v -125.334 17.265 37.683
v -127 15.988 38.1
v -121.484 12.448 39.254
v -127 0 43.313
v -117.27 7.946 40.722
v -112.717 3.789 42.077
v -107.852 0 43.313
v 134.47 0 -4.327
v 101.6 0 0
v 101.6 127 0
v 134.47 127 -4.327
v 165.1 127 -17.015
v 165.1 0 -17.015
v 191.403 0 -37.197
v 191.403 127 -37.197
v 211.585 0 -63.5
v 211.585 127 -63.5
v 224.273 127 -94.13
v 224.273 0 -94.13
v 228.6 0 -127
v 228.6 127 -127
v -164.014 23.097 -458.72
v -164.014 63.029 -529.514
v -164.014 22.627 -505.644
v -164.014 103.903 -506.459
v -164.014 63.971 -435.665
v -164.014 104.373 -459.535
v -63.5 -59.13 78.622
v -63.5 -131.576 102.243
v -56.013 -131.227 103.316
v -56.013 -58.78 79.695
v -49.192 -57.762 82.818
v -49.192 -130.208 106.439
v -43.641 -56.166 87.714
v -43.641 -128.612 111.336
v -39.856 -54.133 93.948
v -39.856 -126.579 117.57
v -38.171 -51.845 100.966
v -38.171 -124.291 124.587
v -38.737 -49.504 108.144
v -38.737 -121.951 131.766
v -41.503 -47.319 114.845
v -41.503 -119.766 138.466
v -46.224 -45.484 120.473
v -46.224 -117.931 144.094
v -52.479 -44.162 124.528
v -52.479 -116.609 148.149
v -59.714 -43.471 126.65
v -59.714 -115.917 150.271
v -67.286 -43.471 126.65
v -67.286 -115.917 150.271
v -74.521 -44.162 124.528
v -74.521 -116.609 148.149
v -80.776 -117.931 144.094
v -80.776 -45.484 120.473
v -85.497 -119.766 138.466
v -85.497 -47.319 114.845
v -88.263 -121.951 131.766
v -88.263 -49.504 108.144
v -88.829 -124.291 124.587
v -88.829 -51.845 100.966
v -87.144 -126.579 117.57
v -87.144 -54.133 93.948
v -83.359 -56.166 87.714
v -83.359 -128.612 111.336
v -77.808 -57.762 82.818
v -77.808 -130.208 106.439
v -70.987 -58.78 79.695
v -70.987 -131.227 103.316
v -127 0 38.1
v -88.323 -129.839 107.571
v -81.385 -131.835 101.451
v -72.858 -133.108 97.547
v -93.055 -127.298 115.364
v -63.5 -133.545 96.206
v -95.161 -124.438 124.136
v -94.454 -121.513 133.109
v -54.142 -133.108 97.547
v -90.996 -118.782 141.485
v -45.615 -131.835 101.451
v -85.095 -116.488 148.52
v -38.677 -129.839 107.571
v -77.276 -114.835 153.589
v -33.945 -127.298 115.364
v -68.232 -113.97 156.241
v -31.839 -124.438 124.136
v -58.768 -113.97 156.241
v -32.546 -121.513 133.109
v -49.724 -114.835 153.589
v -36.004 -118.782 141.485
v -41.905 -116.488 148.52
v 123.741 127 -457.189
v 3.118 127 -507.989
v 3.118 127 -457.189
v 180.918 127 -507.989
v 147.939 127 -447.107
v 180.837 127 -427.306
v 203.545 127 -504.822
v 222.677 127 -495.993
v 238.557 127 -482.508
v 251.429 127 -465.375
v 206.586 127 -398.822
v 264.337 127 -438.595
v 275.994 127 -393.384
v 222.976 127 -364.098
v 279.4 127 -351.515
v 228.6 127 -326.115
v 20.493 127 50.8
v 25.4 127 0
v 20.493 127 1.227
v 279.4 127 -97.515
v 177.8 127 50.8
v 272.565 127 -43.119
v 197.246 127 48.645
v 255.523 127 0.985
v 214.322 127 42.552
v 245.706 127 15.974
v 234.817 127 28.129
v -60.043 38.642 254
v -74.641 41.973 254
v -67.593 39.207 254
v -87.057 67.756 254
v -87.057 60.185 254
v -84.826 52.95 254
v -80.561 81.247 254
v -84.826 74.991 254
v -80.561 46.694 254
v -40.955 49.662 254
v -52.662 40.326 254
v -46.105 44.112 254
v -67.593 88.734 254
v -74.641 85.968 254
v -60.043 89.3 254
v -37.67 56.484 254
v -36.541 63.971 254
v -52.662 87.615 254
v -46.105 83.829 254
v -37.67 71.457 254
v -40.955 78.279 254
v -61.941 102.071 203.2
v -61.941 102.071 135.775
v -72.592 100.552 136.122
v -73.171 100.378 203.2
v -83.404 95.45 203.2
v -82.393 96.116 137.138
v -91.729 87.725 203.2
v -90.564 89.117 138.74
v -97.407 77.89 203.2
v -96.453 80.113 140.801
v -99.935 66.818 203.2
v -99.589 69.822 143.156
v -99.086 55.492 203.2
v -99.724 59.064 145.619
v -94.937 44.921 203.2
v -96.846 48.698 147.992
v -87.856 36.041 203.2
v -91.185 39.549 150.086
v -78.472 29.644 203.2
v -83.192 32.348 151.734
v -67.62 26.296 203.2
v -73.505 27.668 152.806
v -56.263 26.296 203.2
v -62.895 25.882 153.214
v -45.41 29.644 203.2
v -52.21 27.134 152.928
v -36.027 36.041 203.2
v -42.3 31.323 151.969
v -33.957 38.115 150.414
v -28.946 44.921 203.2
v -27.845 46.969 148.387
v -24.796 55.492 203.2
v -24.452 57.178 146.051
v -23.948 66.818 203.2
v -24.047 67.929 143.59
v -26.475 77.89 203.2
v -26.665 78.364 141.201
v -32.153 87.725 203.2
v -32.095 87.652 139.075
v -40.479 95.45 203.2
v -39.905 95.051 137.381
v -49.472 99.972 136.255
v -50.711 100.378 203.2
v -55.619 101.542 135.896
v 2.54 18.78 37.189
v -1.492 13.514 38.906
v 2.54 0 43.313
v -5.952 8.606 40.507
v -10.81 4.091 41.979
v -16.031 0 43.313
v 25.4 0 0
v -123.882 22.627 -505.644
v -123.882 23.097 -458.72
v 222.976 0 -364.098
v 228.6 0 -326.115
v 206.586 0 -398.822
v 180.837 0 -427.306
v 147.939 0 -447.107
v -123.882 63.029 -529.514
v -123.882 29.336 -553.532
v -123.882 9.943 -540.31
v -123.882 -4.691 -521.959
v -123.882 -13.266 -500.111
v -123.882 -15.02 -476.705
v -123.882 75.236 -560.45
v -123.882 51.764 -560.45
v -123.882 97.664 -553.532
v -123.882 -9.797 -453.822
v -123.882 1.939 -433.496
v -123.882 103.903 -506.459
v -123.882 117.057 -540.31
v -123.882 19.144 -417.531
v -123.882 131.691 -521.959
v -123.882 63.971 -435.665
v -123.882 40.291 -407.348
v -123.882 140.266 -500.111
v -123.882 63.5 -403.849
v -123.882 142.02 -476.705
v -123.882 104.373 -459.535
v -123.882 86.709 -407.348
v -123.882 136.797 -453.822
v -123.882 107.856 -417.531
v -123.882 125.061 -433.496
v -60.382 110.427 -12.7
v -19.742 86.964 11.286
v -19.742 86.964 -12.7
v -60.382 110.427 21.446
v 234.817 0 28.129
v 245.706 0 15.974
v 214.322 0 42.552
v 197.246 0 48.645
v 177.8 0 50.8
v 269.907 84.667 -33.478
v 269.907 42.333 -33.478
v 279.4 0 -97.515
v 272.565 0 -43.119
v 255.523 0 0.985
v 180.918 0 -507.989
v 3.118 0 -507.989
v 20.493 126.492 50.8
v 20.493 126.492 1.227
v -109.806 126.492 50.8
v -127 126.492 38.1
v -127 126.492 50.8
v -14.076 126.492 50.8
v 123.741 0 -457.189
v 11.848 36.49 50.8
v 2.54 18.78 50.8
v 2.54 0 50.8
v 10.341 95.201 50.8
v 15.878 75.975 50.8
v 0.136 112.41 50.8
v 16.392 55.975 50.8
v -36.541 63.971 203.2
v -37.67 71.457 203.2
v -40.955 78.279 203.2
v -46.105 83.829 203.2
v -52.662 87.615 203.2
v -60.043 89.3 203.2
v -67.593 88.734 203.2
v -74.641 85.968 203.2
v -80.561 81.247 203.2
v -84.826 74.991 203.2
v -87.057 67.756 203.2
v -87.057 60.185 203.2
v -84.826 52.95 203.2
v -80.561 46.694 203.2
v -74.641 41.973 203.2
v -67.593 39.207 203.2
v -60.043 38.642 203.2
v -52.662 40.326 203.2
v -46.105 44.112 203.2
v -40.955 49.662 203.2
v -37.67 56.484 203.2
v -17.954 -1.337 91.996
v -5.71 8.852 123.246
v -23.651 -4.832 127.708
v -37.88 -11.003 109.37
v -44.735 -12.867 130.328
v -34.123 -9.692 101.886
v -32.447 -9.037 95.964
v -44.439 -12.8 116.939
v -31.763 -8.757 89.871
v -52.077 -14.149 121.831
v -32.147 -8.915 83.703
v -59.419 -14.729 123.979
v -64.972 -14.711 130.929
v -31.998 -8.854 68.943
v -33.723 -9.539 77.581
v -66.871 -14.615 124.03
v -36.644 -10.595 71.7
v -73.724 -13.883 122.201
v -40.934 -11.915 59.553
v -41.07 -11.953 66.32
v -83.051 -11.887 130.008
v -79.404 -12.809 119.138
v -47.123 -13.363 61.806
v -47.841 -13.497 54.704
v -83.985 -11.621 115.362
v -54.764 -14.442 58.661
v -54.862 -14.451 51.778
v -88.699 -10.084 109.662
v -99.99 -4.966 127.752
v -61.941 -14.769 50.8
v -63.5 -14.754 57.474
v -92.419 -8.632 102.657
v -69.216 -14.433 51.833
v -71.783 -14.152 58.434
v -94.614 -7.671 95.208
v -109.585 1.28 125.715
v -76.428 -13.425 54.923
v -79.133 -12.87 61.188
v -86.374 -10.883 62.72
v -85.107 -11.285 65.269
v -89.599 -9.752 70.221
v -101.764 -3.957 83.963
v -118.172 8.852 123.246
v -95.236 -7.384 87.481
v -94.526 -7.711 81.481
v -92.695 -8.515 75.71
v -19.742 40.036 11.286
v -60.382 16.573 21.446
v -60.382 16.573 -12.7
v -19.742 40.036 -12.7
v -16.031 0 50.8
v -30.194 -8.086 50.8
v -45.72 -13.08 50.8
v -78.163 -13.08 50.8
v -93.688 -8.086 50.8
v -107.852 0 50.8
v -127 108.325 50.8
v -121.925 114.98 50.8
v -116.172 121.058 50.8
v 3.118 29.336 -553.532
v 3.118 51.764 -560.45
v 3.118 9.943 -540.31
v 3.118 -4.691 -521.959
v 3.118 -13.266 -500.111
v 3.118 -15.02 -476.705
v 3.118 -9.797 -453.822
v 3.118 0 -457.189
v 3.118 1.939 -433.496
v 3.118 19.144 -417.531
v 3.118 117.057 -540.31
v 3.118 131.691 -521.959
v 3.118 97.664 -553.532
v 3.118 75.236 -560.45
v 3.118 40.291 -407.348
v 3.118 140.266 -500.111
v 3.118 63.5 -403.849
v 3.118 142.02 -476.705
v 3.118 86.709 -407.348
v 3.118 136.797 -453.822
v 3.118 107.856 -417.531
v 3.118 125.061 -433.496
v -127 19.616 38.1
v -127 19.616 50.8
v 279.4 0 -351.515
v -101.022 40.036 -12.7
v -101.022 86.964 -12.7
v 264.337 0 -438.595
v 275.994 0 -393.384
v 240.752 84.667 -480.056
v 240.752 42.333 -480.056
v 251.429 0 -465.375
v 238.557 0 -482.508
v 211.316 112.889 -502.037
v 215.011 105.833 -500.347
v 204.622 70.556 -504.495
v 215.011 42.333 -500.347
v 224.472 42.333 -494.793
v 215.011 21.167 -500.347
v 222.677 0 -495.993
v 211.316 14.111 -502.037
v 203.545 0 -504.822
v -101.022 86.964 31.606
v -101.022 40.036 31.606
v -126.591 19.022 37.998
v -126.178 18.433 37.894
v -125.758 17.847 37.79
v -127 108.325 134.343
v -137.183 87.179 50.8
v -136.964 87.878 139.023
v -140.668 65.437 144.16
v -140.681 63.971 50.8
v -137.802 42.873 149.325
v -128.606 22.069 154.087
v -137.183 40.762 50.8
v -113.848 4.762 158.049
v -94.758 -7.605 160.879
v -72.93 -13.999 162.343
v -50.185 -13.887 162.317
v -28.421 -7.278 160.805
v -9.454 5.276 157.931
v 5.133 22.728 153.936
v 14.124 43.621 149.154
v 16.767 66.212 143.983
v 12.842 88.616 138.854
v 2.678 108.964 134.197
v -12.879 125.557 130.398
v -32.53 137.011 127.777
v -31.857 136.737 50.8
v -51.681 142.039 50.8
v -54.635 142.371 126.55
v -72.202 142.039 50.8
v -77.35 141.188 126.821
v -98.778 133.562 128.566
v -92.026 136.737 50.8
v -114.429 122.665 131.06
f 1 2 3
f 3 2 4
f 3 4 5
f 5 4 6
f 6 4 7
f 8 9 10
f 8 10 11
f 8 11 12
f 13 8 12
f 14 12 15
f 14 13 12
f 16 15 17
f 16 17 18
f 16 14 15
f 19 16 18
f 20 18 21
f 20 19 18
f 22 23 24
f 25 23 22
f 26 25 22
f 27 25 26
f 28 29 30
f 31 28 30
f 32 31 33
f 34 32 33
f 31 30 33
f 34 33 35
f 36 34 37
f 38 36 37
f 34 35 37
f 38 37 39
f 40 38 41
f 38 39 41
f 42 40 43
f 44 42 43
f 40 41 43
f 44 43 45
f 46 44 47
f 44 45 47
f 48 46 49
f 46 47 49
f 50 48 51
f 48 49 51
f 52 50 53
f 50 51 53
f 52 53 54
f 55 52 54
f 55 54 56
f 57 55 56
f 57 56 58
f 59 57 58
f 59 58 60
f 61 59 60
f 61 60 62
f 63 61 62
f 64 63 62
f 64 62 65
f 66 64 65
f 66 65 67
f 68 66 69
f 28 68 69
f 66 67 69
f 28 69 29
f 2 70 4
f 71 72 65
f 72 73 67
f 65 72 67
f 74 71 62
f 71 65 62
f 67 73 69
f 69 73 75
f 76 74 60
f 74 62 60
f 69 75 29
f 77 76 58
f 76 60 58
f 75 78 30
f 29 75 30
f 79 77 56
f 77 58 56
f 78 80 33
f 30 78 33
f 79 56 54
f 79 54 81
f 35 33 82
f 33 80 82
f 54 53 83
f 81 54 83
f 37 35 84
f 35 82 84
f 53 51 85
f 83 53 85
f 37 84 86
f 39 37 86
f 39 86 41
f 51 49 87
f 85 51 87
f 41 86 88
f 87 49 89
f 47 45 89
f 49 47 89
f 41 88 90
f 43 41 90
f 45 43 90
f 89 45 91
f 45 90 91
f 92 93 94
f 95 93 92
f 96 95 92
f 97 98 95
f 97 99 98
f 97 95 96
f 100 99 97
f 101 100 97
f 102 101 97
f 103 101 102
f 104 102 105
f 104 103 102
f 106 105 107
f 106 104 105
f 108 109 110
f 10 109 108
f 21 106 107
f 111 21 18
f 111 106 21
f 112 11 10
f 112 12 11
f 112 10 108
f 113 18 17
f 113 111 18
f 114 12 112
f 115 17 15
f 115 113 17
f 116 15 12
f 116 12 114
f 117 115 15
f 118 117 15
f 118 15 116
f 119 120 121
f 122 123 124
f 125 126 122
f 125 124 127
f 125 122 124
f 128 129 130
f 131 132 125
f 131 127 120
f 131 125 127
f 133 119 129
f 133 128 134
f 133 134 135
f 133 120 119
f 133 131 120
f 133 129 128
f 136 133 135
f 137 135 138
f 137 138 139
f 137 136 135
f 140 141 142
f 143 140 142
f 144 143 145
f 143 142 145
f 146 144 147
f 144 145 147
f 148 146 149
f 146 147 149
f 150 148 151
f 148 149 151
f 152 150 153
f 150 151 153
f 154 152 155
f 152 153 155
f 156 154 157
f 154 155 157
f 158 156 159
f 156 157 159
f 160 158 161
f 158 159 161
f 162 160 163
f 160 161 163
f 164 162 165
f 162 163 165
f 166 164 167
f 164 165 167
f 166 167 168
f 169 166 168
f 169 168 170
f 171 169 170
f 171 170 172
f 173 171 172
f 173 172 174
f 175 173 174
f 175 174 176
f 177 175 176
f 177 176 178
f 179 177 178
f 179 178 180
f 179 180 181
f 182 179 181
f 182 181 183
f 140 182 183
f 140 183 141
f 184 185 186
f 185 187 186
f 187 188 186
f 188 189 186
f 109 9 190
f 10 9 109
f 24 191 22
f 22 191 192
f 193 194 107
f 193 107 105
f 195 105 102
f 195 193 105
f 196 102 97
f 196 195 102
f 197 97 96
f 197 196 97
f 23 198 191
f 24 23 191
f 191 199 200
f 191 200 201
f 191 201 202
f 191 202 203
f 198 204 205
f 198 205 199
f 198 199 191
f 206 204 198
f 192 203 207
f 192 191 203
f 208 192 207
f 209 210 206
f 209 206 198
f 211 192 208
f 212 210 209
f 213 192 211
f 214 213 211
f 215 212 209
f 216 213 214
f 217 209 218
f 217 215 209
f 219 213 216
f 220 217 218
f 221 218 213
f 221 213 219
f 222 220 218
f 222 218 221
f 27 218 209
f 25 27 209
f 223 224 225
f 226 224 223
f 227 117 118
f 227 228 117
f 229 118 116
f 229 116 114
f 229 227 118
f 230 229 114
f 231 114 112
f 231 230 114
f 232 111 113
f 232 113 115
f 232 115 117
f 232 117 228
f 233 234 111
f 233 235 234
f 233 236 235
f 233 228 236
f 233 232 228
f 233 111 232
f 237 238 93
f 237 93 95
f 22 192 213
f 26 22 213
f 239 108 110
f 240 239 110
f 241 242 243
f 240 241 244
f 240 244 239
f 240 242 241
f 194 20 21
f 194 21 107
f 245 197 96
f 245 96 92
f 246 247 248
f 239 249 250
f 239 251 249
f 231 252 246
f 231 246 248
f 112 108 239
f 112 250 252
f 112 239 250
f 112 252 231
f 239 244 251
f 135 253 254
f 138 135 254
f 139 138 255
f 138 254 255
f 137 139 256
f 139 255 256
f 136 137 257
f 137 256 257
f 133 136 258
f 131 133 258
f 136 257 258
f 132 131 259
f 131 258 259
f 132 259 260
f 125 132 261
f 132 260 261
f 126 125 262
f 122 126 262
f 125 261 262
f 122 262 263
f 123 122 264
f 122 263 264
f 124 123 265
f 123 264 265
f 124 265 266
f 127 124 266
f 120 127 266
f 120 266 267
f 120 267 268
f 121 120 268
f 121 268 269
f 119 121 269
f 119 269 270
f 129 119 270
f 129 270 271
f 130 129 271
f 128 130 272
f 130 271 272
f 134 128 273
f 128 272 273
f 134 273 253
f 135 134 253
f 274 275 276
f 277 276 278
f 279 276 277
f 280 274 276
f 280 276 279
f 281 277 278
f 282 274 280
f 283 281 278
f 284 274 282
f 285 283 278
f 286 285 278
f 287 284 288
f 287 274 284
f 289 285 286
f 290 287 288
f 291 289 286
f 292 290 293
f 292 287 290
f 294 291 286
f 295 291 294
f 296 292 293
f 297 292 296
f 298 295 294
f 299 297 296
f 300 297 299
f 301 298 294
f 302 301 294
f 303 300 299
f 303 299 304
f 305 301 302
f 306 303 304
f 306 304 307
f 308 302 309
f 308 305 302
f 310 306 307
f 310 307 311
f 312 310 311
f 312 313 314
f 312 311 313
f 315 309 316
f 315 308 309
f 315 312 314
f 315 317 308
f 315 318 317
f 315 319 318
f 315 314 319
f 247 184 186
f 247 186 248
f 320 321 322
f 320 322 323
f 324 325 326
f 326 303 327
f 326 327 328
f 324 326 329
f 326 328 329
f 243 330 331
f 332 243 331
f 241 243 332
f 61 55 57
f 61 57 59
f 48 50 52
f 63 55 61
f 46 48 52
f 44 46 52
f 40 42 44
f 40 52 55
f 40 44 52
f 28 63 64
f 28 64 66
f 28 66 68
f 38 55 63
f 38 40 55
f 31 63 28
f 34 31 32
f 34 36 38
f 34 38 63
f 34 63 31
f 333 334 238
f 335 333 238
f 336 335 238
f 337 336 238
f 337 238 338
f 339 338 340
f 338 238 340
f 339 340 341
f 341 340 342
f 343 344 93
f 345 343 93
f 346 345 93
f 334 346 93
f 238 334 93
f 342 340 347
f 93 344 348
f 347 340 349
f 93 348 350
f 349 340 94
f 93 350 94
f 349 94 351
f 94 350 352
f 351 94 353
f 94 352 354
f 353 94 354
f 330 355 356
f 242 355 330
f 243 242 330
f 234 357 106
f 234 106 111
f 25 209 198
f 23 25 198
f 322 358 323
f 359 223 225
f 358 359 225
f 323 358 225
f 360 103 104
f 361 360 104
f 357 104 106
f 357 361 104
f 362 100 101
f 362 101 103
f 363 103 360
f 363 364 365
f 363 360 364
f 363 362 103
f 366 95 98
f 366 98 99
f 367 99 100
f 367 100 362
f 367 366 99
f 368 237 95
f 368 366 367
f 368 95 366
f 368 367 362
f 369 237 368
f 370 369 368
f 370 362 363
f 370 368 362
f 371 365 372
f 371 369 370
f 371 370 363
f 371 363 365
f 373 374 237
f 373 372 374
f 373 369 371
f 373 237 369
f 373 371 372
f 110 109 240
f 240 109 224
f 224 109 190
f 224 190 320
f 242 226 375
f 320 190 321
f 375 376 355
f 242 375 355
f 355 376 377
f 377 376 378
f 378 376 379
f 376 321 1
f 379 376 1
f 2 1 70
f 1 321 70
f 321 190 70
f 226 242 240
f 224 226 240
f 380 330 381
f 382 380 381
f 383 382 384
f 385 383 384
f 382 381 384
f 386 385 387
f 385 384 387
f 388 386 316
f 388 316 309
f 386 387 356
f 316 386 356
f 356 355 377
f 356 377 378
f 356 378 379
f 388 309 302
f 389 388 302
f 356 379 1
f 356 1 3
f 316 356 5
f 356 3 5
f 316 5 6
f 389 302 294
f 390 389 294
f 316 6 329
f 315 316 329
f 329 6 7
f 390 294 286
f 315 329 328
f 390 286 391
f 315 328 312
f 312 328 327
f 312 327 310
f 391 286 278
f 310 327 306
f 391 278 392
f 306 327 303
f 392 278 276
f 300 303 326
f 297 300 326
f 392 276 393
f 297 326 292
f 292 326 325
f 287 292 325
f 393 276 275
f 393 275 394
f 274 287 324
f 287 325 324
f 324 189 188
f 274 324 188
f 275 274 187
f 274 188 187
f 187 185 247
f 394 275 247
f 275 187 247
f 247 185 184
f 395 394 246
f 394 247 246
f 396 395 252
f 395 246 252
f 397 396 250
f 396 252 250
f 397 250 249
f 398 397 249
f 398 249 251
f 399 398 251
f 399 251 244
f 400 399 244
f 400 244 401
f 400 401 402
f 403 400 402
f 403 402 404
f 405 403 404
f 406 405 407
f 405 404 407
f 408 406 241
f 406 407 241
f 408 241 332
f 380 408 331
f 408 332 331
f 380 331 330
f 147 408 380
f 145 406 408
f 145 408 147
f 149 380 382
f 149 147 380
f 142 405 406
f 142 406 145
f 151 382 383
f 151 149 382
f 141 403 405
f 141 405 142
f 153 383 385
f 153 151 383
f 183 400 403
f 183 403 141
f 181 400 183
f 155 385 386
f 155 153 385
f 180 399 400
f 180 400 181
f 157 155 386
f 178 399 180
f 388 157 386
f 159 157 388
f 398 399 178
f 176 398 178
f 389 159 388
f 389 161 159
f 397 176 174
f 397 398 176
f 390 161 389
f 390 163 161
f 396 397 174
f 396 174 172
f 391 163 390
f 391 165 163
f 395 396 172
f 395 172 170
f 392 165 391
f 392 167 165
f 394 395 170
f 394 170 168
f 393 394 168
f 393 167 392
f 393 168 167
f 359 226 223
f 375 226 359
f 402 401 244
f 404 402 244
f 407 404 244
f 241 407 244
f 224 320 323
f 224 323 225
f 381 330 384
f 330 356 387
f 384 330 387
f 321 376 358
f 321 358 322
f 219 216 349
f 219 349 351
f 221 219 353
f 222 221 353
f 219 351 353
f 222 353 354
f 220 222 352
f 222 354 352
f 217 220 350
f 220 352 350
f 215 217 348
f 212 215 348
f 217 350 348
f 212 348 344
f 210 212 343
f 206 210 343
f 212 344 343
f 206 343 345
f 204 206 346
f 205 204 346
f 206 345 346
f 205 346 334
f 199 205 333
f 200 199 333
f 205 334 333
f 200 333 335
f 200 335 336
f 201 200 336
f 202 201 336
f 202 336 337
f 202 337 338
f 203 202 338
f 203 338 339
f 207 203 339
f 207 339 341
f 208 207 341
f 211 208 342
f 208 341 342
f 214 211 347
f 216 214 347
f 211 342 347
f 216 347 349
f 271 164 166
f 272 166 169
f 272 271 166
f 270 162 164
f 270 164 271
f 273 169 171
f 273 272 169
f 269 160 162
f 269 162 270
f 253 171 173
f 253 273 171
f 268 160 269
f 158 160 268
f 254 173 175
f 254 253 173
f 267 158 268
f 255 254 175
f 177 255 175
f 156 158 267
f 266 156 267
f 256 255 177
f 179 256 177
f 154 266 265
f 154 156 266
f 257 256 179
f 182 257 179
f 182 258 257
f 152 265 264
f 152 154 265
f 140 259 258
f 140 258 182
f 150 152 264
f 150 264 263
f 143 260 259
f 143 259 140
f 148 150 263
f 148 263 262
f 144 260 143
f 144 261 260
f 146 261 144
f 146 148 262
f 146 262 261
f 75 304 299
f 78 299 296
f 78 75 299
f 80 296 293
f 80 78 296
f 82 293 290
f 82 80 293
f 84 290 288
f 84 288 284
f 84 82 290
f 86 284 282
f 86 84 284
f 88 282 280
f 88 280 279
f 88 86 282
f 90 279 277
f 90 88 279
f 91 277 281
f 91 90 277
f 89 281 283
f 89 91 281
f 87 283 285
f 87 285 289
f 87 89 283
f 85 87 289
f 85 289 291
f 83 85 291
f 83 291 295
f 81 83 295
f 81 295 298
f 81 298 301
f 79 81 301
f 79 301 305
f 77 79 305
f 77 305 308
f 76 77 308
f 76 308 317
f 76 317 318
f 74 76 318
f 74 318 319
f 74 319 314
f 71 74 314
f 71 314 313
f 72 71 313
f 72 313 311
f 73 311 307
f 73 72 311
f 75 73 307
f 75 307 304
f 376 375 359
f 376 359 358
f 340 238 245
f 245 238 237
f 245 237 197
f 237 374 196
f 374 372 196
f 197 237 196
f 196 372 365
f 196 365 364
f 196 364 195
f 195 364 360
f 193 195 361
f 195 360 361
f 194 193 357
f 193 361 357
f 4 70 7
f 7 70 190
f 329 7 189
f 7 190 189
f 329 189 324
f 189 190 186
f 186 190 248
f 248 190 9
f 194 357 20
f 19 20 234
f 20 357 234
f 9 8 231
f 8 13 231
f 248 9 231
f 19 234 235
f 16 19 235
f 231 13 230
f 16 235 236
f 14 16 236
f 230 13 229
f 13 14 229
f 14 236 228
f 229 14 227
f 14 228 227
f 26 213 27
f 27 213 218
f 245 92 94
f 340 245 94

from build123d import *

# Parameters (mm, degrees)
BOSS_EXTRUDE1_DEPTH      = 127
SKETCH2_R                = 78.74
BOSS_EXTRUDE2_DEPTH      = 127
BOSS_EXTRUDE3_DEPTH      = 40.132
SKETCH4_W                = 50.8
SKETCH4_H                = 127
BOSS_EXTRUDE4_DEPTH      = 127
CUT_EXTRUDE1_DEPTH       = 643.951973118
BOSS_EXTRUDE6_DEPTH      = 63.5
BOSS_EXTRUDE7_DEPTH      = 0.254
SKETCH10_R               = 78.74
BOSS_EXTRUDE8_DEPTH      = 127
CUT_EXTRUDE4_DEPTH       = 1270
SKETCH12_R               = 38.1
BOSS_EXTRUDE9_DEPTH      = 152.4
SKETCH13_R               = 25.4
BOSS_EXTRUDE10_DEPTH     = 50.8
BOSS_EXTRUDE11_DEPTH     = 127
CUT_EXTRUDE16_DEPTH      = 0.508
CUT_EXTRUDE17_REACH      = 733.584
CUT_EXTRUDE17_END_RADIUS = 78.74
SKETCH25_W               = 132.08
SKETCH25_H               = 81.28
SKETCH25_R               = 31.75
SKETCH26_R               = 25.4
CUT_EXTRUDE18_DEPTH      = 76.2


with BuildPart() as part:
    # Sketch1 → Boss-Extrude1 (new body)
    with BuildSketch(Plane(origin=(0, 0, 0), x_dir=(1, 0, 0), z_dir=(0, 1, 0))):
        with BuildLine():
            Line((0, 0), (76.2, 0))
            Line((76.2, 0), (101.6, 0))
            ThreePointArc((101.6, 0), (191.402561211, 37.197438789), (228.6, 127))
            Line((228.6, 127), (228.6, 326.115224022))
            ThreePointArc((228.6, 326.115224022), (206.586135695, 398.822078741), (147.938986841, 447.106743761))
            Line((147.938986841, 447.106743761), (123.740682893, 457.189370406))
            Line((123.740682893, 457.189370406), (3.117633302, 457.189370406))
            Line((3.117633302, 457.189370406), (3.117633302, 507.989370406))
            Line((3.117633302, 507.989370406), (130.117633302, 507.989370406))
            Line((130.117633302, 507.989370406), (180.917633302, 507.989370406))
            add(Edge.make_bspline(
                [(180.917633302, 507.989370406), (258.096842752, 507.989370406), (279.4, 408.366132146), (279.4, 351.515224022)],
                knots=[0, 0, 0, 0, 0.284383622, 0.284383622, 0.284383622, 0.284383622], degree=3))
            Line((279.4, 351.515224022), (279.4, 97.515224022))
            add(Edge.make_bspline(
                [(279.4, 97.515224022), (279.4, 39.949501281), (253.612703292, -50.8), (177.8, -50.8)],
                knots=[0.713423735, 0.713423735, 0.713423735, 0.713423735, 1, 1, 1, 1], degree=3))
            Line((177.8, -50.8), (127, -50.8))
            Line((127, -50.8), (0, -50.8))
            Line((0, -50.8), (0, 0))
        make_face()
    extrude(amount=BOSS_EXTRUDE1_DEPTH)

    # Sketch2 → Boss-Extrude2 (add)
    with BuildSketch(Plane.ZY.offset(-3.117633302)):
        with Locations((-482.589370406, 63.5)):
            Circle(SKETCH2_R)
    extrude(amount=BOSS_EXTRUDE2_DEPTH)

    # Sketch3 → Boss-Extrude3 (add)
    with BuildSketch(Plane.ZY.offset(123.882366698)):
        Polygon((-435.664699602, 63.970535124), (-459.534530374, 104.373224542), (-506.459201178, 103.902689418), (-529.514041209, 63.029464876), (-505.644210437, 22.626775458), (-458.719539633, 23.097310582), align=None)
    extrude(amount=BOSS_EXTRUDE3_DEPTH)

    # Sketch4 → Boss-Extrude4 (add)
    with BuildSketch(Plane.ZY):
        with Locations((25.4, 63.5)):
            Rectangle(SKETCH4_W, SKETCH4_H)
    extrude(amount=BOSS_EXTRUDE4_DEPTH)

    # Sketch5 → Cut-Extrude1 (cut, through all)
    with BuildSketch(Plane(origin=(0, 0, 0), x_dir=(-1, 0, 0), z_dir=(0, -1, 0))):
        Polygon((127, -38.1), (127, 0), (-25.4, 0), align=None)
    extrude(amount=-CUT_EXTRUDE1_DEPTH, mode=Mode.SUBTRACT)

    # Sketch7 → Boss-Extrude6 (add)
    with BuildSketch(Plane.XY.offset(50.8)):
        Polygon((-60.382366698, 110.42702988), (-101.022366698, 86.96351494), (-101.022366698, 40.03648506), (-60.382366698, 16.57297012), (-19.742366698, 40.03648506), (-19.742366698, 86.96351494), align=None)
    extrude(amount=-BOSS_EXTRUDE6_DEPTH)

    # Sketch9 → Boss-Extrude7 (add)
    with BuildSketch(Plane.XY.offset(50.8)):
        Polygon((-61.941183349, 110.42702988), (-102.581183349, 86.96351494), (-102.581183349, 40.03648506), (-61.941183349, 16.57297012), (-21.301183349, 40.03648506), (-21.301183349, 86.96351494), align=None)
    extrude(amount=BOSS_EXTRUDE7_DEPTH)

    # Sketch10 → Boss-Extrude8 (add)
    with BuildSketch(Plane.XY.offset(50.8)):
        with Locations(Location((-61.941183349, 63.970535124, 0), (0, 0, 145.715287544))):
            Circle(SKETCH10_R)
    extrude(amount=BOSS_EXTRUDE8_DEPTH)

    # Sketch11 → Cut-Extrude4 (cut, symmetric)
    with BuildSketch(Plane(origin=(-139.7, 0, 0), x_dir=(0, 0, -1), z_dir=(1, 0, 0))):
        Polygon((-201.145745502, -18.230355882), (-201.145745502, 206.905410628), (-111.777750152, 206.905410628), (-201.145745502, -183.515968434), align=None)
    extrude(amount=CUT_EXTRUDE4_DEPTH, both=True, mode=Mode.SUBTRACT)

    # Sketch12 → Boss-Extrude9 (add)
    with BuildSketch(Plane.XY.offset(50.8)):
        with Locations(Location((-61.941183349, 63.970535124, 0), (0, 0, 90))):
            Circle(SKETCH12_R)
    extrude(amount=BOSS_EXTRUDE9_DEPTH)

    # Sketch13 → Boss-Extrude10 (add)
    with BuildSketch(Plane.XY.offset(203.2)):
        with Locations((-61.941183349, 63.970535124)):
            Circle(SKETCH13_R)
    extrude(amount=BOSS_EXTRUDE10_DEPTH)

    # Sketch18 → Boss-Extrude11 (add)
    with BuildSketch(Plane(origin=(0, 0, 0), x_dir=(0, 0, -1), z_dir=(1, 0, 0))):
        Polygon((-50.8, -14.769464876), (-90.168883972, -135.51337145), (-162.615227917, -111.892041067), (-123.246343944, 8.851865507), align=None)
    extrude(amount=-BOSS_EXTRUDE11_DEPTH)

    # Sketch24 → Cut-Extrude16 (cut)
    with BuildSketch(Plane(origin=(0, 127, 0), x_dir=(1, 0, 0), z_dir=(0, 1, 0))):
        Polygon((20.493010652, -50.8), (20.493010652, -1.226747337), (-127, -38.1), (-127, -50.8), align=None)
    extrude(amount=-CUT_EXTRUDE16_DEPTH, mode=Mode.SUBTRACT)

    # Cut-Extrude17: up to this cylinder (the profile starts outside it)
    cut_extrude17_end = Plane(origin=(-61.941183349, 63.970535124, 126.392056), z_dir=(0, 0, -1)) * Cylinder(CUT_EXTRUDE17_END_RADIUS, 1625.648, mode=Mode.PRIVATE)
    # Sketch25 → Cut-Extrude17 (cut, up to the surface)
    with BuildSketch(Plane(origin=(0, -149.065926338, 48.603356681), x_dir=(1, 0, 0), z_dir=(0, -0.950739421843146, 0.3099912123808683)), mode=Mode.PRIVATE) as cut_extrude17_sk1:
        with Locations((-63.5, 81.819158306)):
            Rectangle(SKETCH25_W, SKETCH25_H)
        with Locations(Location((-63.5, 81.819158306, 0), (0, 0, 270))):
            Circle(SKETCH25_R, mode=Mode.SUBTRACT)
    cut_extrude17_tool1 = extrude(cut_extrude17_sk1.sketch, amount=-CUT_EXTRUDE17_REACH, mode=Mode.PRIVATE) - cut_extrude17_end
    add(cut_extrude17_tool1.solids().sort_by_distance((0.989143, -123.702706, 126.392056))[0], mode=Mode.SUBTRACT)

    # Sketch26 → Cut-Extrude18 (cut)
    with BuildSketch(Plane(origin=(0, -149.065926338, 48.603356681), x_dir=(1, 0, 0), z_dir=(0, -0.950739421843146, 0.30999121238086846))):
        with Locations(Location((-63.5, 81.819158306, 0), (0, 0, 270))):
            Circle(SKETCH26_R)
    extrude(amount=-CUT_EXTRUDE18_DEPTH, mode=Mode.SUBTRACT)


solid = part.part
